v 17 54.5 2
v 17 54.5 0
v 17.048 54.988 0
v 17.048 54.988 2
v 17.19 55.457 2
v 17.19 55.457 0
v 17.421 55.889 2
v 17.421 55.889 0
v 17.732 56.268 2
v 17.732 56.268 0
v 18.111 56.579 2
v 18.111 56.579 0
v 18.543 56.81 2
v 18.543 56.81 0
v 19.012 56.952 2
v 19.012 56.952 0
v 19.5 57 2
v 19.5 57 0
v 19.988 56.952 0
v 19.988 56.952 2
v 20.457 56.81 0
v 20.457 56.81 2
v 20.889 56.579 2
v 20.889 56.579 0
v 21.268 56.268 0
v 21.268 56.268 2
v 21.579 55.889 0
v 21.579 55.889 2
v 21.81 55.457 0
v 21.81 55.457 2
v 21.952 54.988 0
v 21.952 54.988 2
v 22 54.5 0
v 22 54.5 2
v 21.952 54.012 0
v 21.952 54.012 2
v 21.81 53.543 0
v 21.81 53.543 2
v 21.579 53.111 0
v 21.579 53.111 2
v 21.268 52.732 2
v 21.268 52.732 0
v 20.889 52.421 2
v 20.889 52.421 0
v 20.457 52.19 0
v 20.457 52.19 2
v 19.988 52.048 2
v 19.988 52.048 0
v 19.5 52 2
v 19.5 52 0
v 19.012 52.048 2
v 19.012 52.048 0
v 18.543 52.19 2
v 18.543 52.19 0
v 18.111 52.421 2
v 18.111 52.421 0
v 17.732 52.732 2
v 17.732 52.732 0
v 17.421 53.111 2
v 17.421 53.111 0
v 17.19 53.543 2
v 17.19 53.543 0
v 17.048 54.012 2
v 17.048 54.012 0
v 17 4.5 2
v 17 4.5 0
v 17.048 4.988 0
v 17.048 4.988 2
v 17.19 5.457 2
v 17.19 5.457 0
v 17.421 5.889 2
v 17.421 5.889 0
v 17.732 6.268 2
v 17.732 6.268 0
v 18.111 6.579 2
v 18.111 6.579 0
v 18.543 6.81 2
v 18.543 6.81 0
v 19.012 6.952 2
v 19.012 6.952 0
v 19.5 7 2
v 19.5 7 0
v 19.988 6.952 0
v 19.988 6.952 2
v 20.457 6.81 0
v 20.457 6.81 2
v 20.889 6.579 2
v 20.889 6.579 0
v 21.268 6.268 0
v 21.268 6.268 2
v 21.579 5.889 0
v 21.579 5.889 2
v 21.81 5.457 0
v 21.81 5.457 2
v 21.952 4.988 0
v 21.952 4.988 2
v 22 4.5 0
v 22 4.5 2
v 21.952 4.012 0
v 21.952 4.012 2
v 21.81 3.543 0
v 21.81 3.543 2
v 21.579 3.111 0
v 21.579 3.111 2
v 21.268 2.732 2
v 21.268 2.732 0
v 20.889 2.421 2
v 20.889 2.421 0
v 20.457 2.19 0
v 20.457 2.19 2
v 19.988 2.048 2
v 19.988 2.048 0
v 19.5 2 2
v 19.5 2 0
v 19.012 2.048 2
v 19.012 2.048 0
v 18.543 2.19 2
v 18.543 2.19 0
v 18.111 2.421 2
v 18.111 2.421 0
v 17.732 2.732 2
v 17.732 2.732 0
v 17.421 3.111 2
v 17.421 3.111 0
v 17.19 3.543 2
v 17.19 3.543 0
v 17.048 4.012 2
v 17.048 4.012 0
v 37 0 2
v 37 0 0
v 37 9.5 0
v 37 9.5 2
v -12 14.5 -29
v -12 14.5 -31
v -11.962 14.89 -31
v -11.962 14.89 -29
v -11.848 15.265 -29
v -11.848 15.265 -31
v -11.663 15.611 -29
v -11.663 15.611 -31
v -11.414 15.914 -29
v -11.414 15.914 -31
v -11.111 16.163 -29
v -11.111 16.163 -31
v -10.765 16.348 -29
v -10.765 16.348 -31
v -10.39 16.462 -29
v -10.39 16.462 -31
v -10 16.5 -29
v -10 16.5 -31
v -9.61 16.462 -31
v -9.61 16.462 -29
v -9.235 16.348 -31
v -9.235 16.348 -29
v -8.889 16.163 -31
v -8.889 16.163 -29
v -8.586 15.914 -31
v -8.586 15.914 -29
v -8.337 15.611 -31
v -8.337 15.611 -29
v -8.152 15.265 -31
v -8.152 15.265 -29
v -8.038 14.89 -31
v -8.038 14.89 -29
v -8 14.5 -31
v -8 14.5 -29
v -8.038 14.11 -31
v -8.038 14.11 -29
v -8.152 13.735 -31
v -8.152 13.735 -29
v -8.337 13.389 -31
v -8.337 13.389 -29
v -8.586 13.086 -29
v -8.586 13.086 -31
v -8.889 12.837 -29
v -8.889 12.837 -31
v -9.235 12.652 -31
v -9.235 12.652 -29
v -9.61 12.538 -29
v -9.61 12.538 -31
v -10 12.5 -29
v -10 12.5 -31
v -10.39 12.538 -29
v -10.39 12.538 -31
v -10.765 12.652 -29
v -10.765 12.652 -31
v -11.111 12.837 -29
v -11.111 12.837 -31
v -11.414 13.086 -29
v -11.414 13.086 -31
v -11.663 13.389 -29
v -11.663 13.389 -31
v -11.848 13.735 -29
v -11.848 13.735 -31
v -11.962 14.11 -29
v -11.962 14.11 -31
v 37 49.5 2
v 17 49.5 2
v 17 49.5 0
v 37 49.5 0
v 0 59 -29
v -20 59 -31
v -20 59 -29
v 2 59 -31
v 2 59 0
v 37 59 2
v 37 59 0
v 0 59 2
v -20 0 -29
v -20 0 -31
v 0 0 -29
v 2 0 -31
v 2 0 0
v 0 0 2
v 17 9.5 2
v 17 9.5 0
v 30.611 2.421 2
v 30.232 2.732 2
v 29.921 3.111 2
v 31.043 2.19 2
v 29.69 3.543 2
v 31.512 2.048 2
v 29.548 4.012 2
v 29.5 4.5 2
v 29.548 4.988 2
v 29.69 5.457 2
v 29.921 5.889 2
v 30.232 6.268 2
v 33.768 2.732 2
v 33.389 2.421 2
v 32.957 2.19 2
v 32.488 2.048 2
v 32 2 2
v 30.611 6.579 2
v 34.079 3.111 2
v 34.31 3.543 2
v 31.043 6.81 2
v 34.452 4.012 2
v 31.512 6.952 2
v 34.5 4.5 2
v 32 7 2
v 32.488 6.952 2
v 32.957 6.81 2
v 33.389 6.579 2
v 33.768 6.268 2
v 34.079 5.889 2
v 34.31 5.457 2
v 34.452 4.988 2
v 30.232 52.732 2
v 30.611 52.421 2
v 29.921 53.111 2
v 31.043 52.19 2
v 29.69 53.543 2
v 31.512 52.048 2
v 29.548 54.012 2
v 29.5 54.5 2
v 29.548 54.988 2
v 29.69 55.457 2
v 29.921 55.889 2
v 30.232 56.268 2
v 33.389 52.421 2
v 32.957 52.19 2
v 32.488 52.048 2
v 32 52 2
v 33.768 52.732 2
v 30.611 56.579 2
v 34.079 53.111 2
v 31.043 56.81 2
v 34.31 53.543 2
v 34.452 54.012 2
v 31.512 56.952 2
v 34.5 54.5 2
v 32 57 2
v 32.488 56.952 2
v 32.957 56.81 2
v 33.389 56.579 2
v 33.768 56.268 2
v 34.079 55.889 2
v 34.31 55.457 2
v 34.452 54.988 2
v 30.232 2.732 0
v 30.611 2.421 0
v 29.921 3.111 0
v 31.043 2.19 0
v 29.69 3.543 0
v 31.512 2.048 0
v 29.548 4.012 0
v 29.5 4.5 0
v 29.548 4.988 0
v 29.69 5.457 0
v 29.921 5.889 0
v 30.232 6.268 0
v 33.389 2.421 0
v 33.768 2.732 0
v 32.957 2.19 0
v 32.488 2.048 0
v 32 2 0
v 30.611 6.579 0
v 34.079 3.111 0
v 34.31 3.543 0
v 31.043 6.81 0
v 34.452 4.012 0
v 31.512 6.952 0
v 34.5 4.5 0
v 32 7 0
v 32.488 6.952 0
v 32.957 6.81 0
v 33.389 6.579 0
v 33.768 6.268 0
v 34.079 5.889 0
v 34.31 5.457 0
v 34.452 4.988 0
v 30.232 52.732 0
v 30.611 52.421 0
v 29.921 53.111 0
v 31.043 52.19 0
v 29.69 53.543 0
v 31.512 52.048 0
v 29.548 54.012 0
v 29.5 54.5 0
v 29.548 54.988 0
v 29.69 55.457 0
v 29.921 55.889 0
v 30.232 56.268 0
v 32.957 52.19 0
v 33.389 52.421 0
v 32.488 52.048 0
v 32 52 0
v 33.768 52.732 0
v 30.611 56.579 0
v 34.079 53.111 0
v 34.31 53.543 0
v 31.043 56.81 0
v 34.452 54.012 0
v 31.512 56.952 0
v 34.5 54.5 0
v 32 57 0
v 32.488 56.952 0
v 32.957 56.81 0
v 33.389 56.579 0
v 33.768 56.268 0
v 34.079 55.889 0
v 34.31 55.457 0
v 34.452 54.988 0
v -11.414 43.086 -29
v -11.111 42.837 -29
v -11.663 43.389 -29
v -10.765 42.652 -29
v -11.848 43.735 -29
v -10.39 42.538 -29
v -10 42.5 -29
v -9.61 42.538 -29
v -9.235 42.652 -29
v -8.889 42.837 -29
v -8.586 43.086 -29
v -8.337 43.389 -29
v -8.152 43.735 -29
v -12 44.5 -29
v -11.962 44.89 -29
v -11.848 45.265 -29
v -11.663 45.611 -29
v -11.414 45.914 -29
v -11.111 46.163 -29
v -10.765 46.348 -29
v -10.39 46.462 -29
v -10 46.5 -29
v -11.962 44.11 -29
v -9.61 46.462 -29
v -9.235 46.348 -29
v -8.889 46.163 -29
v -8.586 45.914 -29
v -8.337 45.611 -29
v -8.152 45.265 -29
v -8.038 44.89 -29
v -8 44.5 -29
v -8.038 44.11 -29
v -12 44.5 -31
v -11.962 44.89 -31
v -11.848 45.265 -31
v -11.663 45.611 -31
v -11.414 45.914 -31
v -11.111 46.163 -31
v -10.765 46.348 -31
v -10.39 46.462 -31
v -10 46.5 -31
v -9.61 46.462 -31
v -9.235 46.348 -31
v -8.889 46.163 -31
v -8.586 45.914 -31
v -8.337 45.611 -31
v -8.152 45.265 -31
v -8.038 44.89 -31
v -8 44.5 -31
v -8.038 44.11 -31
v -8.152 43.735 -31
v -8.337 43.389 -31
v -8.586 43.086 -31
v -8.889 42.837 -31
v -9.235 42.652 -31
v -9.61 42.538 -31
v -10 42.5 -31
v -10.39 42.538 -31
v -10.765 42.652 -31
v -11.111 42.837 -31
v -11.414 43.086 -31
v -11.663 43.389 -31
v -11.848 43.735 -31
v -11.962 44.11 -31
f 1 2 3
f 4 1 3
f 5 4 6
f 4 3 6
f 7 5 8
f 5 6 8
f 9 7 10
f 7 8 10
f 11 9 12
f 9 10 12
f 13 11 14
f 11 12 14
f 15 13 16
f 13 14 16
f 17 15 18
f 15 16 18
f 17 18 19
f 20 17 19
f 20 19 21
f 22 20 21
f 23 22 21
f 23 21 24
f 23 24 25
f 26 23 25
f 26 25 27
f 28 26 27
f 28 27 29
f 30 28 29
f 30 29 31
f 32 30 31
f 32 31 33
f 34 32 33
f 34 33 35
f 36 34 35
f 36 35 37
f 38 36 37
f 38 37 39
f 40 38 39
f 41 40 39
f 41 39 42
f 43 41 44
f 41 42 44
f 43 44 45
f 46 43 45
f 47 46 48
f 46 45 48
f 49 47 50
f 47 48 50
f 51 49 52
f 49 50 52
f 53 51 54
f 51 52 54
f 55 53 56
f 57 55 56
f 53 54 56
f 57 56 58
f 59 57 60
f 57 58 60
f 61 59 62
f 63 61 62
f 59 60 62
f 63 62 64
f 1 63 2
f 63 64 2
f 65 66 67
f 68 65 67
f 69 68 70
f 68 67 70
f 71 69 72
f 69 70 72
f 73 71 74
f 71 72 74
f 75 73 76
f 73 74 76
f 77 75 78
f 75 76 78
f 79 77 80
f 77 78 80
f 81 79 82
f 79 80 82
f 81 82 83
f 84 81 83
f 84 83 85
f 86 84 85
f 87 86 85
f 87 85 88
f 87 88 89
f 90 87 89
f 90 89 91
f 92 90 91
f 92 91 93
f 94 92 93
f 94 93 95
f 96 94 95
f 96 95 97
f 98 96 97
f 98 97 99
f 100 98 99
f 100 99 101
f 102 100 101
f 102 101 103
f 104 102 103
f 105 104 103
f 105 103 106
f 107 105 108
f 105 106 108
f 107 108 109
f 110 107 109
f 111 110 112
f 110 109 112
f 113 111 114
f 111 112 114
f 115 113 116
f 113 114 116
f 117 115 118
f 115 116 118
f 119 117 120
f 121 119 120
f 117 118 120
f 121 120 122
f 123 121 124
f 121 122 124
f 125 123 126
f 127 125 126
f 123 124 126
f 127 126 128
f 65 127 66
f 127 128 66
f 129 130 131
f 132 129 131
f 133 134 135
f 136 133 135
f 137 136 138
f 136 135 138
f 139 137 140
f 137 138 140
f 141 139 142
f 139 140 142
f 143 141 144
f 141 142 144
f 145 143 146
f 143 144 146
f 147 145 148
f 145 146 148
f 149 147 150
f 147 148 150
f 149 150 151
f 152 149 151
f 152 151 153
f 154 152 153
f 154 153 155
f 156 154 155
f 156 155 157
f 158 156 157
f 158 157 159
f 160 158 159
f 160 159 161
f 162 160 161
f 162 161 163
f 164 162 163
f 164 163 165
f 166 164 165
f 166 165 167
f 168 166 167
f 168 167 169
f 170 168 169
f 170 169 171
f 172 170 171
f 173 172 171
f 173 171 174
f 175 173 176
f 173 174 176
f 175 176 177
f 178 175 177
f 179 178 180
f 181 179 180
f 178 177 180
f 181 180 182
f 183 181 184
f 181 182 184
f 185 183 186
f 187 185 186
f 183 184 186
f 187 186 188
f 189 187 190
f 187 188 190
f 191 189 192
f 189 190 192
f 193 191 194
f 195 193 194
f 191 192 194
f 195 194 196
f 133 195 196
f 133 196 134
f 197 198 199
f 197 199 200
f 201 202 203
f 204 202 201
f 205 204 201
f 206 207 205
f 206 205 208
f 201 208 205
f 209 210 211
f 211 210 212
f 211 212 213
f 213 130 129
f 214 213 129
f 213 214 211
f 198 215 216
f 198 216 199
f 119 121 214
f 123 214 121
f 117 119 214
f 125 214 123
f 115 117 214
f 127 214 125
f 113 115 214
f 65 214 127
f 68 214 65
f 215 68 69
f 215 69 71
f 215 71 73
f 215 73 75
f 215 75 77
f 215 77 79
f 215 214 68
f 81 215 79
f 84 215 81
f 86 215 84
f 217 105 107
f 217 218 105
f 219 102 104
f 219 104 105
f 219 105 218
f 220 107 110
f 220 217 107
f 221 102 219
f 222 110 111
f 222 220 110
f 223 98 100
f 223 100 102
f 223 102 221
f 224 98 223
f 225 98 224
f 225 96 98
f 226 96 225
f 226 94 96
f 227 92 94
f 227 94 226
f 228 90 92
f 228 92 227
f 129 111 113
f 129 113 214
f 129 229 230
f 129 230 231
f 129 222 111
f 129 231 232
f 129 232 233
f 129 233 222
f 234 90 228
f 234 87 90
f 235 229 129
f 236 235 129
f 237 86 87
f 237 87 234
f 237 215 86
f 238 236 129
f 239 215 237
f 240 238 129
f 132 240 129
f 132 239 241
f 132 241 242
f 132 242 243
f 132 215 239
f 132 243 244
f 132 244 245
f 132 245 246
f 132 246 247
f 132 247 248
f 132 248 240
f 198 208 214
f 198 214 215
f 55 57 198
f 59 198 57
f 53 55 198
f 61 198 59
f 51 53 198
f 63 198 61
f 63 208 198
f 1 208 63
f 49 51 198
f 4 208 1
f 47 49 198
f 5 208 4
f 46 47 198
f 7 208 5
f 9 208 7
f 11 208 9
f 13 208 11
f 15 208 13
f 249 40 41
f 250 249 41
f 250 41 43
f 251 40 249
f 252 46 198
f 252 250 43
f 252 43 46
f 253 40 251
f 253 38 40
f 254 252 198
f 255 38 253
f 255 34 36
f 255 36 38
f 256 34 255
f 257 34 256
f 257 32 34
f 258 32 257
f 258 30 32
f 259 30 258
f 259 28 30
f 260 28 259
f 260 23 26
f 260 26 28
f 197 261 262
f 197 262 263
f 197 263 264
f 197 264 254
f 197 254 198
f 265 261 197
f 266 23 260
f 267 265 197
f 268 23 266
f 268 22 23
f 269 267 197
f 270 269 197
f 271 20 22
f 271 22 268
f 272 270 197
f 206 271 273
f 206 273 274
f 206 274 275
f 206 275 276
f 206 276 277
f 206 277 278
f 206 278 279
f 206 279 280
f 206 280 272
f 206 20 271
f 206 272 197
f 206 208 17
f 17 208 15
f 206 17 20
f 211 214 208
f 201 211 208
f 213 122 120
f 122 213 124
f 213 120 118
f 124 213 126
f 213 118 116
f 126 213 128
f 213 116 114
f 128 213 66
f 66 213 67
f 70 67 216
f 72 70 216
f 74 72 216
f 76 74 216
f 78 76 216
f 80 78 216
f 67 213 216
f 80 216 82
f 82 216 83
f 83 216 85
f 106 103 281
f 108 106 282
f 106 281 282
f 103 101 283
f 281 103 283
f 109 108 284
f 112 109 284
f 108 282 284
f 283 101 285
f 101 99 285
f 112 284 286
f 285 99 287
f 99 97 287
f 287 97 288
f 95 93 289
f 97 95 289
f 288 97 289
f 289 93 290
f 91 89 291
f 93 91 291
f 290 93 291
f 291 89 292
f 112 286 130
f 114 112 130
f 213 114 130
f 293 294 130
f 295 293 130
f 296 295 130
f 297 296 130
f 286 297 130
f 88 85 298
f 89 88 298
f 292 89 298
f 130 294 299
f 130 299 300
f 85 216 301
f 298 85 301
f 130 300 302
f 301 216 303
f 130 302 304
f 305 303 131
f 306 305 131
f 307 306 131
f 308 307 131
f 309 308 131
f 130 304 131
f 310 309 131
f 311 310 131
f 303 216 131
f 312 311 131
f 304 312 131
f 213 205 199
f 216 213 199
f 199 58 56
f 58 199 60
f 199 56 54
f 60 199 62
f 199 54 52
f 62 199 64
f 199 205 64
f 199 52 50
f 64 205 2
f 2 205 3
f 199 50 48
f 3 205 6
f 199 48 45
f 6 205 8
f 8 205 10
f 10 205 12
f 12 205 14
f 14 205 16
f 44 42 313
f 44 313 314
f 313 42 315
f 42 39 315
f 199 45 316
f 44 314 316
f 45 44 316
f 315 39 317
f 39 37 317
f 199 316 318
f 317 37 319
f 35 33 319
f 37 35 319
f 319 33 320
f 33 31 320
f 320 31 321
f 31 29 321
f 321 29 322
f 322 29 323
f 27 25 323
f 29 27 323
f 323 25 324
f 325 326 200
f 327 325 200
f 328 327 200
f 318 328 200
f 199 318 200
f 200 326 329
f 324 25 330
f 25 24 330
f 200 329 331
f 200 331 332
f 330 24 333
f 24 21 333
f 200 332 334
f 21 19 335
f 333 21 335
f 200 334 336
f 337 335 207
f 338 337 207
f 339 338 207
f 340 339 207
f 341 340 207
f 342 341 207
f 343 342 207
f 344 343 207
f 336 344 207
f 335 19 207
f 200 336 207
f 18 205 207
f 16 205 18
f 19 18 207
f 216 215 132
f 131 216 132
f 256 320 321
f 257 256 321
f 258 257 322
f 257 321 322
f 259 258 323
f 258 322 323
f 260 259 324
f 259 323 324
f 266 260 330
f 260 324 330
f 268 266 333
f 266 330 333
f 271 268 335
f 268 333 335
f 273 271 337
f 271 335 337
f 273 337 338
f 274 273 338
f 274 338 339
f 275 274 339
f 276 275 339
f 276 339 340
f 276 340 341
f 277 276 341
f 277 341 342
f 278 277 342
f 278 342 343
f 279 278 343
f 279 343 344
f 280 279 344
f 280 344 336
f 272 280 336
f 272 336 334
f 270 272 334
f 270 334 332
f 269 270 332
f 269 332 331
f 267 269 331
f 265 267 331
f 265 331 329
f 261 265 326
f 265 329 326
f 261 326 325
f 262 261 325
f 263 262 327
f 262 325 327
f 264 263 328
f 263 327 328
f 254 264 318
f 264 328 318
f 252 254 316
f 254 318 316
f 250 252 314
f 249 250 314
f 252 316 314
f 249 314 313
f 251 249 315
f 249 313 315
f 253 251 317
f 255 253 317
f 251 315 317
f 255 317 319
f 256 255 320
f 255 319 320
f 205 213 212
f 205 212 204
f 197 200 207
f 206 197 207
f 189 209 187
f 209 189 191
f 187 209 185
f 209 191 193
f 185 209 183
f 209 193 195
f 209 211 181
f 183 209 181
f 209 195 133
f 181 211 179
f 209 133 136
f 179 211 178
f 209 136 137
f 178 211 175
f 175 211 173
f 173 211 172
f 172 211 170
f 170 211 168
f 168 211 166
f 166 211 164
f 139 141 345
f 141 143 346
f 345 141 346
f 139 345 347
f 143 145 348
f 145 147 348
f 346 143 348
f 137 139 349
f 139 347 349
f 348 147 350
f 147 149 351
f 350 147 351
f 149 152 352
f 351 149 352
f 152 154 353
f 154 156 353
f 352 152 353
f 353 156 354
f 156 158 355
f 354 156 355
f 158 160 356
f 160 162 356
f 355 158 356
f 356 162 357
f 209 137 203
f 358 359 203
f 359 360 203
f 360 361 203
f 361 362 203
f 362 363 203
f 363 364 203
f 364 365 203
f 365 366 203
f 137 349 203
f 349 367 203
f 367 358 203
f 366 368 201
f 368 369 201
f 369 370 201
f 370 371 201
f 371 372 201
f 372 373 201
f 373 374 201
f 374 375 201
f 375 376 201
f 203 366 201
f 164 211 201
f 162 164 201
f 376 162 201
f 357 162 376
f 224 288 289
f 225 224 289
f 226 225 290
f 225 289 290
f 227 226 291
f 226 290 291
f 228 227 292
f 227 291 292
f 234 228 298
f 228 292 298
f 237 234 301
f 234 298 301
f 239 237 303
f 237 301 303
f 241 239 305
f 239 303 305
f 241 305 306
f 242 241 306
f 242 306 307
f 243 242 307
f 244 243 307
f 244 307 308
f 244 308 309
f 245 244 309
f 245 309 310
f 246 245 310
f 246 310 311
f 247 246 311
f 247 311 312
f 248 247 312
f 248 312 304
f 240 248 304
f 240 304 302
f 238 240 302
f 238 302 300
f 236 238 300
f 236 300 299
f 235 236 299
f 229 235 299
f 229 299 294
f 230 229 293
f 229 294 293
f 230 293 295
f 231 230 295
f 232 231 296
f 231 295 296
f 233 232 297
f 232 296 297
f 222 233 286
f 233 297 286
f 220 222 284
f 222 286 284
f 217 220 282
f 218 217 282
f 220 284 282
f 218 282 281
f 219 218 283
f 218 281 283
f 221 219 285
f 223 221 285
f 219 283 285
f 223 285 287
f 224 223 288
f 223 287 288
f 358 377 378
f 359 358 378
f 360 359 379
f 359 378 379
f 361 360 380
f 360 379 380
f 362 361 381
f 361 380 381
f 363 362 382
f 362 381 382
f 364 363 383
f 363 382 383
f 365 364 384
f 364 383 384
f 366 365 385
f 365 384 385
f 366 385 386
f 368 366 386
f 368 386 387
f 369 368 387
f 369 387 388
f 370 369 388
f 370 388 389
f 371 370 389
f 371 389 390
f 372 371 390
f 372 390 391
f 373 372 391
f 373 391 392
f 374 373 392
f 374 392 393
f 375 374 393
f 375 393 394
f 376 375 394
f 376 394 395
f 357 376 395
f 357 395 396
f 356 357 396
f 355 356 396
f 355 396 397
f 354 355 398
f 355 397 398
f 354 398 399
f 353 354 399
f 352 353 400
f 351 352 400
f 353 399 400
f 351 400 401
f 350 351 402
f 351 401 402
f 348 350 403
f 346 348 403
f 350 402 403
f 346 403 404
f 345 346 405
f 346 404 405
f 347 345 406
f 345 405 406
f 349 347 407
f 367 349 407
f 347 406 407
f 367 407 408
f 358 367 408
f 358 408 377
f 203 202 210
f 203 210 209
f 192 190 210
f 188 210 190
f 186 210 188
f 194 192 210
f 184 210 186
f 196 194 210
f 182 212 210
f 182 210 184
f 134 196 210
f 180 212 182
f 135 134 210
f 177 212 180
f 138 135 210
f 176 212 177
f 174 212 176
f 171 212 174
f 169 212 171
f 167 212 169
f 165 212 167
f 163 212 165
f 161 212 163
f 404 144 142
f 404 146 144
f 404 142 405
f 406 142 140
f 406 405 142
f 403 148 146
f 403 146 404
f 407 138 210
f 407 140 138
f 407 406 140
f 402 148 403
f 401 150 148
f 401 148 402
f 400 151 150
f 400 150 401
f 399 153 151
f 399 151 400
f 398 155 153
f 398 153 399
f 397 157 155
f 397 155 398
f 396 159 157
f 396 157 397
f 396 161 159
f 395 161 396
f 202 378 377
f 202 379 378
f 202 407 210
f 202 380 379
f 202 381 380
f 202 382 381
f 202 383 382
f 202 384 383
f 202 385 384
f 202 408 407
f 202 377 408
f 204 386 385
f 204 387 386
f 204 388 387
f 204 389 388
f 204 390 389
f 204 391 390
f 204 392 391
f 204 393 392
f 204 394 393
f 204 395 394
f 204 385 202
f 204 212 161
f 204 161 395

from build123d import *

# Parameters (mm, degrees)
SKETCH_1_W          = 37
SKETCH_1_H          = 59
EXTRUDE_1_DEPTH     = 2
SKETCH_2_W          = 20
SKETCH_2_H          = 40
CUT_EXTRUDE_1_DEPTH = 2
SKETCH_3_W          = 2
SKETCH_3_H          = 59
EXTRUDE_2_DEPTH     = 31
SKETCH_4_W          = 2
SKETCH_4_H          = 59
EXTRUDE_3_DEPTH     = 20
SKETCH_5_R          = 2
CUT_EXTRUDE_2_DEPTH = 20
SKETCH_6_R          = 2.5
CUT_EXTRUDE_3_DEPTH = 20


with BuildPart() as part:
    # 草图1 → 凸台-拉伸1 (new body)
    with BuildSketch(Plane.XY):
        with Locations((18.5, 29.5)):
            Rectangle(SKETCH_1_W, SKETCH_1_H)
    extrude(amount=EXTRUDE_1_DEPTH)

    # 草图2 → 切除-拉伸1 (cut)
    with BuildSketch(Plane.XY.offset(2)):
        with Locations((27, 29.5)):
            Rectangle(SKETCH_2_W, SKETCH_2_H)
    extrude(amount=-CUT_EXTRUDE_1_DEPTH, mode=Mode.SUBTRACT)

    # 草图3 → 凸台-拉伸2 (add)
    with BuildSketch(Plane(origin=(0, 0, 0), x_dir=(-1, 0, 0), z_dir=(0, 0, -1))):
        with Locations((-1, 29.5)):
            Rectangle(SKETCH_3_W, SKETCH_3_H)
    extrude(amount=EXTRUDE_2_DEPTH)

    # 草图4 → 凸台-拉伸3 (add)
    with BuildSketch(Plane.ZY):
        with Locations((-30, 29.5)):
            Rectangle(SKETCH_4_W, SKETCH_4_H)
    extrude(amount=EXTRUDE_3_DEPTH)

    # 草图5 → 切除-拉伸2 (cut)
    with BuildSketch(Plane(origin=(0, 0, -31), x_dir=(-1, 0, 0), z_dir=(0, 0, -1))):
        with Locations((10, 44.5)):
            Circle(SKETCH_5_R)
        with Locations((10, 14.5)):
            Circle(SKETCH_5_R)
    extrude(amount=-CUT_EXTRUDE_2_DEPTH, mode=Mode.SUBTRACT)

    # 草图6 → 切除-拉伸3 (cut)
    with BuildSketch(Plane(origin=(0, 0, 0), x_dir=(-1, 0, 0), z_dir=(0, 0, -1))):
        with Locations((-32, 54.5)):
            Circle(SKETCH_6_R)
        with Locations((-19.5, 54.5)):
            Circle(SKETCH_6_R)
        with Locations((-19.5, 4.5)):
            Circle(SKETCH_6_R)
        with Locations((-32, 4.5)):
            Circle(SKETCH_6_R)
    extrude(amount=-CUT_EXTRUDE_3_DEPTH, mode=Mode.SUBTRACT)


solid = part.part
